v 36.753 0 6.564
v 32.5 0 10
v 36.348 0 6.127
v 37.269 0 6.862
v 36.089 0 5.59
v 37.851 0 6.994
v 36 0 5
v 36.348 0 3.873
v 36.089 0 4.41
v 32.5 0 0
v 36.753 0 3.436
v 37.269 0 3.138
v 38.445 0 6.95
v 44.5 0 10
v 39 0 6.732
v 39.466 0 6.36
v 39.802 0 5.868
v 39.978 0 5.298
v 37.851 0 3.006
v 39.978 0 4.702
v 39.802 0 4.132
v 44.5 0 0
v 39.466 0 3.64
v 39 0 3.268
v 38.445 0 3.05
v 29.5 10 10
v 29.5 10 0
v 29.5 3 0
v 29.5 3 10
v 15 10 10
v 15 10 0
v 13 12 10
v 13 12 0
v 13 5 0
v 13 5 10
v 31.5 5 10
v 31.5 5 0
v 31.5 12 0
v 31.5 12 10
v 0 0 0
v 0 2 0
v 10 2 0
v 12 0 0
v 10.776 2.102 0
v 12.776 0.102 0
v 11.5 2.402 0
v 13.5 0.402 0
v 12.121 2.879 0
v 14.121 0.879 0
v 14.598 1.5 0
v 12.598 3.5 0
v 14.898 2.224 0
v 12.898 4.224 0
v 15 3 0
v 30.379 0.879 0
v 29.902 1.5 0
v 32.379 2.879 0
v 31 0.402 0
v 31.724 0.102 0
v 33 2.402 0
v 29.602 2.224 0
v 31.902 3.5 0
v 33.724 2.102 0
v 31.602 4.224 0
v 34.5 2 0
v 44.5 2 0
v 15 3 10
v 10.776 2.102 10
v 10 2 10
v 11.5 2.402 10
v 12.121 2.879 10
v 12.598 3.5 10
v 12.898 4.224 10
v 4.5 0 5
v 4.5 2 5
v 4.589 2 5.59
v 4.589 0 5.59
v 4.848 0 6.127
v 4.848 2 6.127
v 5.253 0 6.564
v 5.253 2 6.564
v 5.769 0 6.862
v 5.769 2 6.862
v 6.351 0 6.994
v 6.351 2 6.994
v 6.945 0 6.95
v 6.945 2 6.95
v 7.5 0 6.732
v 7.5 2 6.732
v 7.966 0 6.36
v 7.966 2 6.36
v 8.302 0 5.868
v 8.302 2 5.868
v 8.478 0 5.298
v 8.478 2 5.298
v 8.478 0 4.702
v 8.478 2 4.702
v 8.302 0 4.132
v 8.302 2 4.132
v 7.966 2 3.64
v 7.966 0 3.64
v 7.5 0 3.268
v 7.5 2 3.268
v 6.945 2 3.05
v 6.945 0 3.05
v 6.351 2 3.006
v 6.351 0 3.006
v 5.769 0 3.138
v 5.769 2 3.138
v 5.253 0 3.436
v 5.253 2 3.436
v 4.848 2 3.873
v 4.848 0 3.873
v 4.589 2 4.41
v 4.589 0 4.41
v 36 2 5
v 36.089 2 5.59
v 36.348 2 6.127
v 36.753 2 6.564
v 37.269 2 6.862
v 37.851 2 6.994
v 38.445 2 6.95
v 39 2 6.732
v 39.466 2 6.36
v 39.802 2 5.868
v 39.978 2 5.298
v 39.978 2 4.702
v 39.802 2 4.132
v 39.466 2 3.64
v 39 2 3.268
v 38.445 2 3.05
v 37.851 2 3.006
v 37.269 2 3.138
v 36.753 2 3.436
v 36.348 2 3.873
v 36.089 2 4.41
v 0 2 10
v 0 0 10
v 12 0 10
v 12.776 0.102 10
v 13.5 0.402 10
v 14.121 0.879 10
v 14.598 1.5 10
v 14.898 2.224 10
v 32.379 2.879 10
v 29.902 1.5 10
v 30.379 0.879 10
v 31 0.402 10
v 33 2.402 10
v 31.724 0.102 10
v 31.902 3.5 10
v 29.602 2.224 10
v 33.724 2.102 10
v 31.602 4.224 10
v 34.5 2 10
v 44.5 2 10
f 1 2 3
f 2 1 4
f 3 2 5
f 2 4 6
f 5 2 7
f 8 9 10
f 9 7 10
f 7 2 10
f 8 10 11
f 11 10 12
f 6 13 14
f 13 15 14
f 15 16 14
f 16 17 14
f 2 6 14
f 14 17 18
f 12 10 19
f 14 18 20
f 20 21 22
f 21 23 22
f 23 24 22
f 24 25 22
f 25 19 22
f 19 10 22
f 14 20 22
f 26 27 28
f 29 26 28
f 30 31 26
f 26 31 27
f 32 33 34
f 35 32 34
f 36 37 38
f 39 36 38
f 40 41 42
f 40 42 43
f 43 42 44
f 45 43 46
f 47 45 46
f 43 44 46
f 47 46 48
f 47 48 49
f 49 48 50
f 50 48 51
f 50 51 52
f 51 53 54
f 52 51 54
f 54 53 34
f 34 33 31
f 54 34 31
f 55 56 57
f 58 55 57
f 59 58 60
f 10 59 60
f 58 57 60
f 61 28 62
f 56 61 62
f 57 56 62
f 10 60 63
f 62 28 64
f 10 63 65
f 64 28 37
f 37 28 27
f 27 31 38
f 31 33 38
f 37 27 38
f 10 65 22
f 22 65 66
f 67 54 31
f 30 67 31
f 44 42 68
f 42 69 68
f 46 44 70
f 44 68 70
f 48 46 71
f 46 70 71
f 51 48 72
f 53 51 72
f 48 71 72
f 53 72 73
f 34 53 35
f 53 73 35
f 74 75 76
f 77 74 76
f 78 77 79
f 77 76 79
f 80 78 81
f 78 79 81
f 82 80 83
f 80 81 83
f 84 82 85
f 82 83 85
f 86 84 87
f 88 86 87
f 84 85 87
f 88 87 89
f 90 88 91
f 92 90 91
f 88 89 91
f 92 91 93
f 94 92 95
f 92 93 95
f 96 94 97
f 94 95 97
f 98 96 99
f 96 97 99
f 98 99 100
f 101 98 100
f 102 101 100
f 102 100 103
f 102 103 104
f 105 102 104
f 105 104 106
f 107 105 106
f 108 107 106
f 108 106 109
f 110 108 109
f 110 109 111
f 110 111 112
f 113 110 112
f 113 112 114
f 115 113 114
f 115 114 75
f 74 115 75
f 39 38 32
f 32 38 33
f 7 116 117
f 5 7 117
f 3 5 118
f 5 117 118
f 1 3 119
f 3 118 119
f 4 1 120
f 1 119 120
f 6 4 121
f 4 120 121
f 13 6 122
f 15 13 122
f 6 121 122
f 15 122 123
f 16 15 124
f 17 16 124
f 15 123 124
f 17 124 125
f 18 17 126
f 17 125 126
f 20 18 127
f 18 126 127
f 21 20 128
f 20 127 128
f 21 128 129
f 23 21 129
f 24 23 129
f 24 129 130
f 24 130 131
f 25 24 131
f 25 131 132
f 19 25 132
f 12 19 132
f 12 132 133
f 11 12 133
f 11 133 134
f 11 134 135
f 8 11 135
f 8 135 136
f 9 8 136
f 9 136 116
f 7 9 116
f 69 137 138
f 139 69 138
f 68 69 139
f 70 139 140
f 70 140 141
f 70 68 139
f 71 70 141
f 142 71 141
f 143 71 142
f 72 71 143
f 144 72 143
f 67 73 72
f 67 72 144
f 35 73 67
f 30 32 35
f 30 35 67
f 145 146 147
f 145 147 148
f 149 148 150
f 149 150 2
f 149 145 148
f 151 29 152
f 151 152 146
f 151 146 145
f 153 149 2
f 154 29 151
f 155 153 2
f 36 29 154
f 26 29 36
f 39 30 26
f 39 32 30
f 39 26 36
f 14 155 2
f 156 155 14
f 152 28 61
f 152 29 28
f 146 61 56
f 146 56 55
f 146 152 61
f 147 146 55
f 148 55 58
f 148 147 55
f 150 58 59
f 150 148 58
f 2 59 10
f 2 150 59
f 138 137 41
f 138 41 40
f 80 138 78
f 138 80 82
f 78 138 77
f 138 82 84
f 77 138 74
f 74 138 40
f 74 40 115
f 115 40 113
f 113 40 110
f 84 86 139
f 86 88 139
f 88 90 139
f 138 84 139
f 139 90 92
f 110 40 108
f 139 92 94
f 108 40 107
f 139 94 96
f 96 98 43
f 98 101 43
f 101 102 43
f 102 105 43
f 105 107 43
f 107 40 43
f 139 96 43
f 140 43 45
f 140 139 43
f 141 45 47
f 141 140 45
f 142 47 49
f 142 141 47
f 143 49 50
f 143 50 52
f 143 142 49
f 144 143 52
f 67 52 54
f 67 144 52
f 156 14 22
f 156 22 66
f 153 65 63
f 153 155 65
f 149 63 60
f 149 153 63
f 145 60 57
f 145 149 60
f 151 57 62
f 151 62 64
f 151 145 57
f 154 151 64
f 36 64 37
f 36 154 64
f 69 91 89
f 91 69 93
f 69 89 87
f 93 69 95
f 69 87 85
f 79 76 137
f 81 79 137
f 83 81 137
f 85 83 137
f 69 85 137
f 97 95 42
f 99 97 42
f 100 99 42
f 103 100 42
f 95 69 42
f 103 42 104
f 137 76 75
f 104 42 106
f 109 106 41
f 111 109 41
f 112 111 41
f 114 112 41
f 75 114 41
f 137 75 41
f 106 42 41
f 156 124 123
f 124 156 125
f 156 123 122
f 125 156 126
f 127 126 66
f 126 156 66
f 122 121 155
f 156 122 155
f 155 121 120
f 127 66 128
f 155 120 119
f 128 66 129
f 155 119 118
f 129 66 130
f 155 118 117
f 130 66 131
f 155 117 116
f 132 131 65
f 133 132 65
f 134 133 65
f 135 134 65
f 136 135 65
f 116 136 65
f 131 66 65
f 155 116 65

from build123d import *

# Parameters (mm, degrees)
F1_DEPTH = 10
F2_R     = 2
F3_DEPTH = 25
F4_R     = 3


with BuildPart() as f1:
    # F0 (on Top) → F1 (new body)
    with BuildSketch(Plane.XY):
        Polygon((0, 2), (0, 0), (15, 0), (15, 10), (22.25, 10), (29.5, 10), (29.5, 0), (44.5, 0), (44.5, 2), (31.5, 2), (31.5, 12), (22.25, 12), (13, 12), (13, 2), align=None)
    extrude(amount=F1_DEPTH)

    # F2 (on face) → F3 (cut)
    with BuildSketch(Plane(origin=(0, 2, 0), x_dir=(-1, 0, 0), z_dir=(0, 1, 0))):
        with Locations((-38, 5)):
            Circle(F2_R)
        with Locations((-6.5, 5)):
            Circle(F2_R)
    extrude(amount=-F3_DEPTH, mode=Mode.SUBTRACT)

    # F4
    f4_edges = [f1.edges().sort_by_distance(p)[0] for p in [
        (31.5, 2, 5),
        (13, 2, 5),
        (29.5, 0, 5),
        (15, 0, 5),
    ]]
    fillet(f4_edges, radius=F4_R)


solid = f1.part
